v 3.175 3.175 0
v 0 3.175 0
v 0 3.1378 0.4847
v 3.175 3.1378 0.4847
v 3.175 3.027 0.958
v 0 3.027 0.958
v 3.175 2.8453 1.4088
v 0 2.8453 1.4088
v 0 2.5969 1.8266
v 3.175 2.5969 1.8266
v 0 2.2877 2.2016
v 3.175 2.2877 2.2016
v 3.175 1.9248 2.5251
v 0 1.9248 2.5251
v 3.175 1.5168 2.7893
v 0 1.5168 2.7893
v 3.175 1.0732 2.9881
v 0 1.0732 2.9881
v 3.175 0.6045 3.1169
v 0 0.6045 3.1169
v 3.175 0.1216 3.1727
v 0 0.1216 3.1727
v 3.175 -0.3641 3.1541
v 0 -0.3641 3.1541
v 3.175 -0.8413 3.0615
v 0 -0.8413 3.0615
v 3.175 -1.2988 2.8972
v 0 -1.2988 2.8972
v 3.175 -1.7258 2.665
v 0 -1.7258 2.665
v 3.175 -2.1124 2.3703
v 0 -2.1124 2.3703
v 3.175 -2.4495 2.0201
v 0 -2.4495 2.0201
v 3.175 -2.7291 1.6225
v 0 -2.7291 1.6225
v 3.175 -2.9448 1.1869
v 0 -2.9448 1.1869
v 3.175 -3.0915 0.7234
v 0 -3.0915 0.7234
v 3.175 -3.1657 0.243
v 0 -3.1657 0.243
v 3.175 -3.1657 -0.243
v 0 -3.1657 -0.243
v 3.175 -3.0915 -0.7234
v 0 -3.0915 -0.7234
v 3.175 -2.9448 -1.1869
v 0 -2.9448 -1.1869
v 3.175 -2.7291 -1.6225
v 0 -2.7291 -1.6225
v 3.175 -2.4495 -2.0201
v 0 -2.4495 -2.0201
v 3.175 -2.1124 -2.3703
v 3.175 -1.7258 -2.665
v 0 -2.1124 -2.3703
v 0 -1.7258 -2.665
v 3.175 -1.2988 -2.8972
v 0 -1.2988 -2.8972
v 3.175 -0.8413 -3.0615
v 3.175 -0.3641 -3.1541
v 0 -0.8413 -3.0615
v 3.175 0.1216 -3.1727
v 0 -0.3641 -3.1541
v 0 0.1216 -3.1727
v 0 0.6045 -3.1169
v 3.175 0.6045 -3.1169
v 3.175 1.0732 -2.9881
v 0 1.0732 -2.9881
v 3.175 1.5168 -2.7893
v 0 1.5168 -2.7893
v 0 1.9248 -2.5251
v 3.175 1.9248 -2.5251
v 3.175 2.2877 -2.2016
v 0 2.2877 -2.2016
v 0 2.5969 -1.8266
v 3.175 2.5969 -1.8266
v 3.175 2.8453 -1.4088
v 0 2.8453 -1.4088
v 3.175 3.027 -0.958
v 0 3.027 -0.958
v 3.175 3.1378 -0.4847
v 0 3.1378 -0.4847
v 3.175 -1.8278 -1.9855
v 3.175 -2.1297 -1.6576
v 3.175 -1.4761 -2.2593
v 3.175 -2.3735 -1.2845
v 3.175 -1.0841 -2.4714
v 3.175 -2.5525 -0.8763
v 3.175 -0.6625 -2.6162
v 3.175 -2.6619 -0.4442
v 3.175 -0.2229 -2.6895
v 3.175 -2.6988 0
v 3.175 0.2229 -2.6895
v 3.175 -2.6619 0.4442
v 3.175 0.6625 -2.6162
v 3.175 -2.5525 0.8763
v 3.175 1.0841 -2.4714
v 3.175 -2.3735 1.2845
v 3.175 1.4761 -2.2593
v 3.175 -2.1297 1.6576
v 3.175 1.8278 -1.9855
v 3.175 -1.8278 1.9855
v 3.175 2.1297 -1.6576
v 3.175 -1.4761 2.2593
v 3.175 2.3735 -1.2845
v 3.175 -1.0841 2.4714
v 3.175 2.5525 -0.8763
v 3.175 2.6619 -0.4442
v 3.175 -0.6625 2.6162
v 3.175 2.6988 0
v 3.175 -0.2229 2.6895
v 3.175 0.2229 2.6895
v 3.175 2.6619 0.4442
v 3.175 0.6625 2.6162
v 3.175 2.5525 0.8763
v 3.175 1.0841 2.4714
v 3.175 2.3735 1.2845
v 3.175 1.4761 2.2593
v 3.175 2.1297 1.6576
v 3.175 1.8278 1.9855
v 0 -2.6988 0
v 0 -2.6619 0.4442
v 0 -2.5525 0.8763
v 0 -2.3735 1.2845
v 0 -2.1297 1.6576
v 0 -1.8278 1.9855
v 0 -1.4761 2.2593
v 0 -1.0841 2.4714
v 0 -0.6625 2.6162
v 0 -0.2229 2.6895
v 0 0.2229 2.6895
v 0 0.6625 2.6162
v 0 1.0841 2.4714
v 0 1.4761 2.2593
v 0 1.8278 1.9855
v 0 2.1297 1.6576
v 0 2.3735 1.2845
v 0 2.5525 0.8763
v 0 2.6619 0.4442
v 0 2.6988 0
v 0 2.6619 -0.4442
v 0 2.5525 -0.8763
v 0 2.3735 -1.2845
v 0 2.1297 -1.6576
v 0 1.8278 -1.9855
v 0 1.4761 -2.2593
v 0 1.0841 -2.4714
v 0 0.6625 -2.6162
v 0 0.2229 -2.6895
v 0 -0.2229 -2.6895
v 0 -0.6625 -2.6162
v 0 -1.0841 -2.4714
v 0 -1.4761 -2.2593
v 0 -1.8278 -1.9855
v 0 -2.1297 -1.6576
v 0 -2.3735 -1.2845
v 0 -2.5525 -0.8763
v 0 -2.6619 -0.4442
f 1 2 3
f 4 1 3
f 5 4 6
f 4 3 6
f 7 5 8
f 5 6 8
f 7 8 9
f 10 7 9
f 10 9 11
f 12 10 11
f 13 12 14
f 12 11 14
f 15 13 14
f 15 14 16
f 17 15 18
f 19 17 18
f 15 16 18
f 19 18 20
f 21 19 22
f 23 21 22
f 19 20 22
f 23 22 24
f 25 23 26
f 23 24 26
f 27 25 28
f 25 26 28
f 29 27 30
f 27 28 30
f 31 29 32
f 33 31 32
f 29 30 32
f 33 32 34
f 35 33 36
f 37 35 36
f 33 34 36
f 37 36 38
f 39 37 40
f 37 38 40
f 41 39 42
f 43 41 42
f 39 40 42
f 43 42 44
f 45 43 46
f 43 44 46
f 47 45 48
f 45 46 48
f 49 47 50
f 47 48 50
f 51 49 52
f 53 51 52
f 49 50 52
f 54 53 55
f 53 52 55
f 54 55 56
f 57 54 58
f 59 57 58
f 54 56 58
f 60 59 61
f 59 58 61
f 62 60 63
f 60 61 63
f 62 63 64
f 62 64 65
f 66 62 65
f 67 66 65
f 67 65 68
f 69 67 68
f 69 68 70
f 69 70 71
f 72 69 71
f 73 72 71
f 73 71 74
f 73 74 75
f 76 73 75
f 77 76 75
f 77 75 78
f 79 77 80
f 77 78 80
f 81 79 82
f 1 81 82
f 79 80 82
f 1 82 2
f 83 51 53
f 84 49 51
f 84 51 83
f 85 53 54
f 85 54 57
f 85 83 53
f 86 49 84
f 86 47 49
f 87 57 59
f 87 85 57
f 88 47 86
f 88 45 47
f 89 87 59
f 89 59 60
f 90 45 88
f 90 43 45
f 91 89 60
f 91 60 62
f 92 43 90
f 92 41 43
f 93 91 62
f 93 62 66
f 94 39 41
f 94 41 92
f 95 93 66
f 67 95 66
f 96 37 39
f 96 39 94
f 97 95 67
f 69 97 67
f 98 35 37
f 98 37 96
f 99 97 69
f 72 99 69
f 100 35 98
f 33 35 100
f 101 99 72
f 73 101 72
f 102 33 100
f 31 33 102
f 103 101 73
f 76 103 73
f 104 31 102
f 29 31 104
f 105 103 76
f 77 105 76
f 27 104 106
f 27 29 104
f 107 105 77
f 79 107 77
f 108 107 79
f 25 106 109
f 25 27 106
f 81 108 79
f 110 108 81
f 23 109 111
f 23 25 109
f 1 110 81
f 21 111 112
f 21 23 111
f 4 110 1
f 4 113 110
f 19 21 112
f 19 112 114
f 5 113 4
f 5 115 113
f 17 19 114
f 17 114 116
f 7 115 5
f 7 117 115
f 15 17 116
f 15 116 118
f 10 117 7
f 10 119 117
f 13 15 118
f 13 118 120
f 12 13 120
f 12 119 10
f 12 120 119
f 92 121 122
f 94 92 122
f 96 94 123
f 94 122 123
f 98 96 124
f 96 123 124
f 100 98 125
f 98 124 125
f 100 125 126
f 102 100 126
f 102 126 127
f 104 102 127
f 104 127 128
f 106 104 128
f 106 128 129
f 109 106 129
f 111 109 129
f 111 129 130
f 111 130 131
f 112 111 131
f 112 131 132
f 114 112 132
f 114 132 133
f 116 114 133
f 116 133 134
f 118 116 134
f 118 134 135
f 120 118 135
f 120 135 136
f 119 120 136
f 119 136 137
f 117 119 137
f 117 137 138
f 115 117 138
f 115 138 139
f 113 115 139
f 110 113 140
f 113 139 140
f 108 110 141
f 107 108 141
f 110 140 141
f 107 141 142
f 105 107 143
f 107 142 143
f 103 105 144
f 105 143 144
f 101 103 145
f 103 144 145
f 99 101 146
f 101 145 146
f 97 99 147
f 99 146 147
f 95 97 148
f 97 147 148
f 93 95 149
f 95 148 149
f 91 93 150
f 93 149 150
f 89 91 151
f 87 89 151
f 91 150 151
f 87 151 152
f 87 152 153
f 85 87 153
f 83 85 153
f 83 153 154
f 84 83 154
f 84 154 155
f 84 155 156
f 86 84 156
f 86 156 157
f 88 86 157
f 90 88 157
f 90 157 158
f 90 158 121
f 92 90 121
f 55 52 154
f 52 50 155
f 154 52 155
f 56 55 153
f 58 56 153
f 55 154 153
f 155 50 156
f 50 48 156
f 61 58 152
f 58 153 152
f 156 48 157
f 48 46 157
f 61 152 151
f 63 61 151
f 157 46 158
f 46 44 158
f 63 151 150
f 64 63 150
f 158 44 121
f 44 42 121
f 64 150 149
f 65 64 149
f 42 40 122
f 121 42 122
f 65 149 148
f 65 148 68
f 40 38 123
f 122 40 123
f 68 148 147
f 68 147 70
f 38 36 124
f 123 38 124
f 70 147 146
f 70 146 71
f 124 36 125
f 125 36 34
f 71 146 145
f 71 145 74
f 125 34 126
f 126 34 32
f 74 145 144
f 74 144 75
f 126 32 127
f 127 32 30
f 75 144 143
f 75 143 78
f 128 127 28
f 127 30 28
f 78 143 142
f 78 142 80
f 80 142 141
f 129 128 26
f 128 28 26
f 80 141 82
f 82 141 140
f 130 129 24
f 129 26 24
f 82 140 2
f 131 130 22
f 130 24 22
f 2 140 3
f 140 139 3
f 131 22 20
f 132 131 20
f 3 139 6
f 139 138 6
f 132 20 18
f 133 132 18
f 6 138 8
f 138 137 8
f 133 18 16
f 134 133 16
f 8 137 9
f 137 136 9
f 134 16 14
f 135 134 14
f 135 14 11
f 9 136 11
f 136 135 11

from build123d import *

# Parameters (mm, degrees)
F0_R     = 12.7
F1_DEPTH = 12.7
F3_D     = 21.59
F4_SCALE = 0.25


with BuildPart() as f1:
    # F0 (on Right) → F1 (new body)
    with BuildSketch(Plane.YZ):
        Circle(F0_R)
    extrude(amount=F1_DEPTH)

    # F3 (through all)
    with Locations(Plane.YZ.offset(12.7)):
        with Locations((0, 0)):
            Hole(F3_D / 2)


with BuildPart() as f1_1:
    # F4: moved
    add(f1.part.scale(F4_SCALE))


solid = f1_1.part
